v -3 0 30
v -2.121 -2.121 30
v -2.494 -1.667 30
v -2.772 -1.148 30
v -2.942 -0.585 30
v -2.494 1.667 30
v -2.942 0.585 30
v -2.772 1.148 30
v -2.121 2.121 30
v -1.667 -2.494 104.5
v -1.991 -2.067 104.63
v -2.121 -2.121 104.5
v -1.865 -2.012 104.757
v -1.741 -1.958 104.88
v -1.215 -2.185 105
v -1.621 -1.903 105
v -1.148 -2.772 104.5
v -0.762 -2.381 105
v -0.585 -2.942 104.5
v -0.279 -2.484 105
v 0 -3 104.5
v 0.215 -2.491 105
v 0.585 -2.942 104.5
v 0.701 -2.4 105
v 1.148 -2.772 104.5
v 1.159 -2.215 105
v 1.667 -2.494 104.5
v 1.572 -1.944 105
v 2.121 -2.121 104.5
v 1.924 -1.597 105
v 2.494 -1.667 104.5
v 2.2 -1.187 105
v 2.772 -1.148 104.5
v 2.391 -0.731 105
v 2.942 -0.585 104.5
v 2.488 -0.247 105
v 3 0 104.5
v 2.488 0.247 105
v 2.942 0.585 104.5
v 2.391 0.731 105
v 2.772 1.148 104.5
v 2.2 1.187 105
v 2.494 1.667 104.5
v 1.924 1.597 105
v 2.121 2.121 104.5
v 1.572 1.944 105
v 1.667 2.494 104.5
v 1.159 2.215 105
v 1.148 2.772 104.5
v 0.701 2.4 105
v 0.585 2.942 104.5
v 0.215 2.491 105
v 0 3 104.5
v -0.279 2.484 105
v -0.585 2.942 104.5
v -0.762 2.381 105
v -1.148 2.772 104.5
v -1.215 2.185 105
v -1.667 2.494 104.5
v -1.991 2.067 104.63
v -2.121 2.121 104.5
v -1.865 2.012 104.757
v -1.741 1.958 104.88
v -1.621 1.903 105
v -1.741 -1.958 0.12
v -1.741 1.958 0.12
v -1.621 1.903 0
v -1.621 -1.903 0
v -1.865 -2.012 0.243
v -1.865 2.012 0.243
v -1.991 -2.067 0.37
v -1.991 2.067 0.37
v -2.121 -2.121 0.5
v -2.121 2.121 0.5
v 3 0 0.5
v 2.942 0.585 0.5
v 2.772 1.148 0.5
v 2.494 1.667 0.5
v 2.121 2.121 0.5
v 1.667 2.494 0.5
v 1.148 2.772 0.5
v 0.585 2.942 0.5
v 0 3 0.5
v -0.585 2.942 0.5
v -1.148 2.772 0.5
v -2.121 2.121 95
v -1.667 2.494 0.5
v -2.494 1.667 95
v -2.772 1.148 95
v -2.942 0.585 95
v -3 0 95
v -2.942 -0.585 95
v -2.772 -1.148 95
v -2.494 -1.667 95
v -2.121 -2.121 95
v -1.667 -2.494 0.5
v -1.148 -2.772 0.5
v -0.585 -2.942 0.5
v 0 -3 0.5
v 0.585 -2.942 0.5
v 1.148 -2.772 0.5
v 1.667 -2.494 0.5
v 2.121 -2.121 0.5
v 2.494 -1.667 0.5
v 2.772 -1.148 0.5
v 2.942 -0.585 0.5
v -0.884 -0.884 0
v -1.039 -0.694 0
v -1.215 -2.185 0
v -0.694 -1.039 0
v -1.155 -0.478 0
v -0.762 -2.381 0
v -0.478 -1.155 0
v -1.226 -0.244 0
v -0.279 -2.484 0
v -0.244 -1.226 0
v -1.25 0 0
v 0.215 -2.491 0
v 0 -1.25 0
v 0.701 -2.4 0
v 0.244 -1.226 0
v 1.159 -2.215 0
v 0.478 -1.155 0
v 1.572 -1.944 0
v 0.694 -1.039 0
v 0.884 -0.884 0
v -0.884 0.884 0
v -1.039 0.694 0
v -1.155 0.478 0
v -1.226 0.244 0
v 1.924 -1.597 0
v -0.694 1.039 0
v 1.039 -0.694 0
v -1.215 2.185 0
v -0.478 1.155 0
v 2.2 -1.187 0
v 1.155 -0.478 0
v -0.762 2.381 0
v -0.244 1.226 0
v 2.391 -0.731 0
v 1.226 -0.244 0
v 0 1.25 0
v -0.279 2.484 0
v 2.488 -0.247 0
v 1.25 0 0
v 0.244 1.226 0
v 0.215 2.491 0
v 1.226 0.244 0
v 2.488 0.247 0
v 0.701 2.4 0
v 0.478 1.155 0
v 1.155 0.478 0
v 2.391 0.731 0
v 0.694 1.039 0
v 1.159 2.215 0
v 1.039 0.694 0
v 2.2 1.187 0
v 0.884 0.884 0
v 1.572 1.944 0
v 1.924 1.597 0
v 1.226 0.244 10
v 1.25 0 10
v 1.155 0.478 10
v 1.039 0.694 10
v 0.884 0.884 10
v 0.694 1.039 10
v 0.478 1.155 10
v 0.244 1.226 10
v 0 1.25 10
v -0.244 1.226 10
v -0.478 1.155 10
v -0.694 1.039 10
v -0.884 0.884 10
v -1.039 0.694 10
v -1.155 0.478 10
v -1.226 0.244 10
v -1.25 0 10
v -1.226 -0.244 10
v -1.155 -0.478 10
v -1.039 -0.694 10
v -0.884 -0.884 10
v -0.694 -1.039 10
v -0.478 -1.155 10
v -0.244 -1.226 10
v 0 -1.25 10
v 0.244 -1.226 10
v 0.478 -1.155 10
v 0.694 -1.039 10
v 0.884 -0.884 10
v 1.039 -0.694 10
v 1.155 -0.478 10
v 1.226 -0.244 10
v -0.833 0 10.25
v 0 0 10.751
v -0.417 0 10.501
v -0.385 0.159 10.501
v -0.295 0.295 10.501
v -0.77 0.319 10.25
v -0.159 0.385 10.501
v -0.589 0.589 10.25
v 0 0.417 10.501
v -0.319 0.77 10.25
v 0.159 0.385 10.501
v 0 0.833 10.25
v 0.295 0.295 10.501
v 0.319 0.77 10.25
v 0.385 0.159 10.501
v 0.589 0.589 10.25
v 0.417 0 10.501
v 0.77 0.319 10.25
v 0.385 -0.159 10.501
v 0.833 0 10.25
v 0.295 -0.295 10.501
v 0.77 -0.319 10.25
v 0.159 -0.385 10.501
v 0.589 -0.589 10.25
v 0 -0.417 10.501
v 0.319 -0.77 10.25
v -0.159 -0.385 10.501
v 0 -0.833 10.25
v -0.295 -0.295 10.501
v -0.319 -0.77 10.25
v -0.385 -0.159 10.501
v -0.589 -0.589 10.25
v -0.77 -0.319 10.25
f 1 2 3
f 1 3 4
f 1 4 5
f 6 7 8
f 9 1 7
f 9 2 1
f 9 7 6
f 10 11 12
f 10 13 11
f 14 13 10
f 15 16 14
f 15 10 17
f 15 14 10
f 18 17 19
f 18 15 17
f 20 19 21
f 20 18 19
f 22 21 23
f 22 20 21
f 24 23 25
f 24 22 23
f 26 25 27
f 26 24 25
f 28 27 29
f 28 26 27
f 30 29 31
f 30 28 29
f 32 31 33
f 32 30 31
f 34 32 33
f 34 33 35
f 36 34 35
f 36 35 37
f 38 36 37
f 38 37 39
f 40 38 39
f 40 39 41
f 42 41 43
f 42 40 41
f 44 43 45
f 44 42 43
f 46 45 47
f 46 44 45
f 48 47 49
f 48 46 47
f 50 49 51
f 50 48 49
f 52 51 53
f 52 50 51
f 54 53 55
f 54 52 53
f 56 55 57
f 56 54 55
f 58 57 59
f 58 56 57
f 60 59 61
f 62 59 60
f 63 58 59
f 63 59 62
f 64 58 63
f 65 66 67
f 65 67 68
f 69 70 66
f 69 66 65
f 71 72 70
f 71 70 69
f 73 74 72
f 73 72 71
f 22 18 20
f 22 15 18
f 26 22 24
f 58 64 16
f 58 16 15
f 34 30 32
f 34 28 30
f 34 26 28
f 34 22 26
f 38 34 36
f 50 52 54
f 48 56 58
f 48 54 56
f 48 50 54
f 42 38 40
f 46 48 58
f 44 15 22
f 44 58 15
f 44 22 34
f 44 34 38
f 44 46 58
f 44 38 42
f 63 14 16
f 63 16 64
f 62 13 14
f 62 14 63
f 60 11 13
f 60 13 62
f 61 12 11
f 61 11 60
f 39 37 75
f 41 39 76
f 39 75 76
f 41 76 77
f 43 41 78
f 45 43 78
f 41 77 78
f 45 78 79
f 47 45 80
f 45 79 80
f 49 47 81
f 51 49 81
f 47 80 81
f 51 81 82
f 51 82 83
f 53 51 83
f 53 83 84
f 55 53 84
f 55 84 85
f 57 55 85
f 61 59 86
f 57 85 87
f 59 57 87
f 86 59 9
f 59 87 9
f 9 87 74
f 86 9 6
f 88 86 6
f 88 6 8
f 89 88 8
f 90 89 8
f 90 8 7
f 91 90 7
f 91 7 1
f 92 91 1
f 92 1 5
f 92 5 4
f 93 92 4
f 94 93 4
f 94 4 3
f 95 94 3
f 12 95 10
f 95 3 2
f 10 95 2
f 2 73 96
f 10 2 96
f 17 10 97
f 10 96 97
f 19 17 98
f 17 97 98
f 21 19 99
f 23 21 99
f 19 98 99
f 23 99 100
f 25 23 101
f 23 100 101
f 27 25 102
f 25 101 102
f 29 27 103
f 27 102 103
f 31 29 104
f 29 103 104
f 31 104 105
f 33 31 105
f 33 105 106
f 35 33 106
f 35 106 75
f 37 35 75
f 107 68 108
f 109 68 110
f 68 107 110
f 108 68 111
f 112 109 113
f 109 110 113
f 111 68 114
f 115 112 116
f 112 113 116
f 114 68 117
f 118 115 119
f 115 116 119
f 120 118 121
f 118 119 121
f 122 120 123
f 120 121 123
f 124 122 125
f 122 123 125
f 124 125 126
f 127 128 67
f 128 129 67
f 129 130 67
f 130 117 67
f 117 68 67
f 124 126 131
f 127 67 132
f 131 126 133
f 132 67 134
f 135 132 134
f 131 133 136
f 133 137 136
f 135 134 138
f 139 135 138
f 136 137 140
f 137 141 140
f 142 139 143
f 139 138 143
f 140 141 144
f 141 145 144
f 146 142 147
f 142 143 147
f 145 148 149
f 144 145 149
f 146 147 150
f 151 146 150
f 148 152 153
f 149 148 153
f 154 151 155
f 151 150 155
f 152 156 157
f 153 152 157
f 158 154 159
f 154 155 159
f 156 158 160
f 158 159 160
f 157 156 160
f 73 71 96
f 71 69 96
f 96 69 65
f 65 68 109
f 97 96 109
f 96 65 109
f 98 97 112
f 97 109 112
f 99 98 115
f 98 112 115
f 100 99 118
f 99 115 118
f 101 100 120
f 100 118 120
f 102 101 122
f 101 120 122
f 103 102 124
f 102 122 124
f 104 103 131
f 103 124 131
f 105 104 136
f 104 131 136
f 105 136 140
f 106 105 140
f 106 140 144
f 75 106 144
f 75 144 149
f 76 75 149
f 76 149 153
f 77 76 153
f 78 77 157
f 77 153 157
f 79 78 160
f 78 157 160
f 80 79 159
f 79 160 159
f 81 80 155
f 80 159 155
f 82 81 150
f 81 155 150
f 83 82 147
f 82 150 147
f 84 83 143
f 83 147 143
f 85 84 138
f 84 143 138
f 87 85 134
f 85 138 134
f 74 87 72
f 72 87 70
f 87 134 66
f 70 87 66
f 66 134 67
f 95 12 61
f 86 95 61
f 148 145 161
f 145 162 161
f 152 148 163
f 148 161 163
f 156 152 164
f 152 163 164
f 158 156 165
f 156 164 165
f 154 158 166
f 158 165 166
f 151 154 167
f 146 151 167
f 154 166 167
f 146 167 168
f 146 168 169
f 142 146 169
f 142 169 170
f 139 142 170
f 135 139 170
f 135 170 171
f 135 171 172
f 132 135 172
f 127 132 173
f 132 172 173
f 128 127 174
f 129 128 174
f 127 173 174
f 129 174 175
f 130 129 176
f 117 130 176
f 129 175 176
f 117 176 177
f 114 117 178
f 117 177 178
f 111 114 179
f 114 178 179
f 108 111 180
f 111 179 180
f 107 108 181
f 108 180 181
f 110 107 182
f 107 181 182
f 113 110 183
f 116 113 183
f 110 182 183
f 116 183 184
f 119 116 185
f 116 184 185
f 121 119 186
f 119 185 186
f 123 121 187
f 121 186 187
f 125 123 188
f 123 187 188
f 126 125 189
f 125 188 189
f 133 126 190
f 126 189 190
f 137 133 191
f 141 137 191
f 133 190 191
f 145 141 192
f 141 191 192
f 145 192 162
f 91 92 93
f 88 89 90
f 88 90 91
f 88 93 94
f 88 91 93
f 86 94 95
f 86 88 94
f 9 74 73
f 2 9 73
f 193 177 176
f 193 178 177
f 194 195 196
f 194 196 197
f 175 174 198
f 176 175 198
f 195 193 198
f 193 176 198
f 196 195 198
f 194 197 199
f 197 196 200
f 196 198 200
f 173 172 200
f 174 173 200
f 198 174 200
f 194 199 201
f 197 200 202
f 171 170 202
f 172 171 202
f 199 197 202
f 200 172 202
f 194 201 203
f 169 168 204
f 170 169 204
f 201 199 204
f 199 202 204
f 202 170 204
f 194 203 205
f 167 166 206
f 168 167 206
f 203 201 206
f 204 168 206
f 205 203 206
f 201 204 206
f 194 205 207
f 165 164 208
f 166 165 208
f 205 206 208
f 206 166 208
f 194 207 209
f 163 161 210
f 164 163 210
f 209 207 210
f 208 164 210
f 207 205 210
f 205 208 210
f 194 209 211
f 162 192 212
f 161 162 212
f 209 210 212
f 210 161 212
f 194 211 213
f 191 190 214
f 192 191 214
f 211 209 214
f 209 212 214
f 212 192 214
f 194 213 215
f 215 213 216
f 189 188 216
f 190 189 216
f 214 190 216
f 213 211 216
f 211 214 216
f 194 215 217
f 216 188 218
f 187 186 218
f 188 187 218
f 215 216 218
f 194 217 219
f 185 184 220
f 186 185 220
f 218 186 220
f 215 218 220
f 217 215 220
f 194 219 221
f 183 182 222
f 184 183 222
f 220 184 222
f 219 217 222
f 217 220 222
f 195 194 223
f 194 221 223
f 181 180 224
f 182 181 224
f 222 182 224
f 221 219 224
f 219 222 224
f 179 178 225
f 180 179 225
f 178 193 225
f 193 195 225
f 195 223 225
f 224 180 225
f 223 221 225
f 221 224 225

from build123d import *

# Parameters (mm, degrees)
SKETCH_1_R          = 3
EXTRUDE_1_DEPTH     = 105
CUT_EXTRUDE_1_DEPTH = 30
CUT_EXTRUDE_START   = -10
CUT_EXTRUDE_2_DEPTH = 10
M3X0_5_1_D          = 2.5
M3X0_5_1_DEPTH      = 10
M3X0_5_1_TIP        = 0.751075774
CHAMFER_1_SIZE      = 0.5


with BuildPart() as part:
    # 草图1 → 凸台-拉伸1 (new body)
    with BuildSketch(Plane.XY):
        Circle(SKETCH_1_R)
    extrude(amount=EXTRUDE_1_DEPTH)

    # 草图2 → 切除-拉伸1 (cut)
    with BuildSketch(Plane(origin=(0, 0, 0), x_dir=(-1, 0, 0), z_dir=(0, 0, -1))):
        with BuildLine():
            ThreePointArc((3, 0), (2.771638598, 1.148050297), (2.121320344, 2.121320344))
            Line((2.121320344, 2.121320344), (2.121320344, -2.121320344))
            ThreePointArc((2.121320344, -2.121320344), (2.771638598, -1.148050297), (3, 0))
        make_face()
    extrude(amount=-CUT_EXTRUDE_1_DEPTH, mode=Mode.SUBTRACT)

    # 草图3 → 切除-拉伸2 (cut)
    with BuildSketch(Plane.XY.offset(105).offset(CUT_EXTRUDE_START)):
        with BuildLine():
            Line((-2.121320344, -2.121320344), (-2.121320344, 2.121320344))
            ThreePointArc((-2.121320344, 2.121320344), (-3, 0), (-2.121320344, -2.121320344))
        make_face()
    extrude(amount=CUT_EXTRUDE_2_DEPTH, mode=Mode.SUBTRACT)

    # M3x0.5 螺纹孔1
    with Locations(Plane(origin=(0, 0, 0), x_dir=(-1, 0, 0), z_dir=(0, 0, -1))):
        with Locations((0, 0)):
            Hole(M3X0_5_1_D / 2, depth=M3X0_5_1_DEPTH)
            with Locations((0, 0, -(M3X0_5_1_DEPTH + M3X0_5_1_TIP / 2))):  # 118° drill point
                Cone(0, M3X0_5_1_D / 2, M3X0_5_1_TIP, mode=Mode.SUBTRACT)

    # 倒角1
    chamfer_1_edges = [part.edges().sort_by_distance(p)[0] for p in [
        (1.148050297, -2.771638598, 105),
        (-2.121320344, 0, 105),
        (1.148050297, 2.771638598, 0),
        (-2.121320344, 0, 0),
    ]]
    chamfer(chamfer_1_edges, length=CHAMFER_1_SIZE)


solid = part.part
